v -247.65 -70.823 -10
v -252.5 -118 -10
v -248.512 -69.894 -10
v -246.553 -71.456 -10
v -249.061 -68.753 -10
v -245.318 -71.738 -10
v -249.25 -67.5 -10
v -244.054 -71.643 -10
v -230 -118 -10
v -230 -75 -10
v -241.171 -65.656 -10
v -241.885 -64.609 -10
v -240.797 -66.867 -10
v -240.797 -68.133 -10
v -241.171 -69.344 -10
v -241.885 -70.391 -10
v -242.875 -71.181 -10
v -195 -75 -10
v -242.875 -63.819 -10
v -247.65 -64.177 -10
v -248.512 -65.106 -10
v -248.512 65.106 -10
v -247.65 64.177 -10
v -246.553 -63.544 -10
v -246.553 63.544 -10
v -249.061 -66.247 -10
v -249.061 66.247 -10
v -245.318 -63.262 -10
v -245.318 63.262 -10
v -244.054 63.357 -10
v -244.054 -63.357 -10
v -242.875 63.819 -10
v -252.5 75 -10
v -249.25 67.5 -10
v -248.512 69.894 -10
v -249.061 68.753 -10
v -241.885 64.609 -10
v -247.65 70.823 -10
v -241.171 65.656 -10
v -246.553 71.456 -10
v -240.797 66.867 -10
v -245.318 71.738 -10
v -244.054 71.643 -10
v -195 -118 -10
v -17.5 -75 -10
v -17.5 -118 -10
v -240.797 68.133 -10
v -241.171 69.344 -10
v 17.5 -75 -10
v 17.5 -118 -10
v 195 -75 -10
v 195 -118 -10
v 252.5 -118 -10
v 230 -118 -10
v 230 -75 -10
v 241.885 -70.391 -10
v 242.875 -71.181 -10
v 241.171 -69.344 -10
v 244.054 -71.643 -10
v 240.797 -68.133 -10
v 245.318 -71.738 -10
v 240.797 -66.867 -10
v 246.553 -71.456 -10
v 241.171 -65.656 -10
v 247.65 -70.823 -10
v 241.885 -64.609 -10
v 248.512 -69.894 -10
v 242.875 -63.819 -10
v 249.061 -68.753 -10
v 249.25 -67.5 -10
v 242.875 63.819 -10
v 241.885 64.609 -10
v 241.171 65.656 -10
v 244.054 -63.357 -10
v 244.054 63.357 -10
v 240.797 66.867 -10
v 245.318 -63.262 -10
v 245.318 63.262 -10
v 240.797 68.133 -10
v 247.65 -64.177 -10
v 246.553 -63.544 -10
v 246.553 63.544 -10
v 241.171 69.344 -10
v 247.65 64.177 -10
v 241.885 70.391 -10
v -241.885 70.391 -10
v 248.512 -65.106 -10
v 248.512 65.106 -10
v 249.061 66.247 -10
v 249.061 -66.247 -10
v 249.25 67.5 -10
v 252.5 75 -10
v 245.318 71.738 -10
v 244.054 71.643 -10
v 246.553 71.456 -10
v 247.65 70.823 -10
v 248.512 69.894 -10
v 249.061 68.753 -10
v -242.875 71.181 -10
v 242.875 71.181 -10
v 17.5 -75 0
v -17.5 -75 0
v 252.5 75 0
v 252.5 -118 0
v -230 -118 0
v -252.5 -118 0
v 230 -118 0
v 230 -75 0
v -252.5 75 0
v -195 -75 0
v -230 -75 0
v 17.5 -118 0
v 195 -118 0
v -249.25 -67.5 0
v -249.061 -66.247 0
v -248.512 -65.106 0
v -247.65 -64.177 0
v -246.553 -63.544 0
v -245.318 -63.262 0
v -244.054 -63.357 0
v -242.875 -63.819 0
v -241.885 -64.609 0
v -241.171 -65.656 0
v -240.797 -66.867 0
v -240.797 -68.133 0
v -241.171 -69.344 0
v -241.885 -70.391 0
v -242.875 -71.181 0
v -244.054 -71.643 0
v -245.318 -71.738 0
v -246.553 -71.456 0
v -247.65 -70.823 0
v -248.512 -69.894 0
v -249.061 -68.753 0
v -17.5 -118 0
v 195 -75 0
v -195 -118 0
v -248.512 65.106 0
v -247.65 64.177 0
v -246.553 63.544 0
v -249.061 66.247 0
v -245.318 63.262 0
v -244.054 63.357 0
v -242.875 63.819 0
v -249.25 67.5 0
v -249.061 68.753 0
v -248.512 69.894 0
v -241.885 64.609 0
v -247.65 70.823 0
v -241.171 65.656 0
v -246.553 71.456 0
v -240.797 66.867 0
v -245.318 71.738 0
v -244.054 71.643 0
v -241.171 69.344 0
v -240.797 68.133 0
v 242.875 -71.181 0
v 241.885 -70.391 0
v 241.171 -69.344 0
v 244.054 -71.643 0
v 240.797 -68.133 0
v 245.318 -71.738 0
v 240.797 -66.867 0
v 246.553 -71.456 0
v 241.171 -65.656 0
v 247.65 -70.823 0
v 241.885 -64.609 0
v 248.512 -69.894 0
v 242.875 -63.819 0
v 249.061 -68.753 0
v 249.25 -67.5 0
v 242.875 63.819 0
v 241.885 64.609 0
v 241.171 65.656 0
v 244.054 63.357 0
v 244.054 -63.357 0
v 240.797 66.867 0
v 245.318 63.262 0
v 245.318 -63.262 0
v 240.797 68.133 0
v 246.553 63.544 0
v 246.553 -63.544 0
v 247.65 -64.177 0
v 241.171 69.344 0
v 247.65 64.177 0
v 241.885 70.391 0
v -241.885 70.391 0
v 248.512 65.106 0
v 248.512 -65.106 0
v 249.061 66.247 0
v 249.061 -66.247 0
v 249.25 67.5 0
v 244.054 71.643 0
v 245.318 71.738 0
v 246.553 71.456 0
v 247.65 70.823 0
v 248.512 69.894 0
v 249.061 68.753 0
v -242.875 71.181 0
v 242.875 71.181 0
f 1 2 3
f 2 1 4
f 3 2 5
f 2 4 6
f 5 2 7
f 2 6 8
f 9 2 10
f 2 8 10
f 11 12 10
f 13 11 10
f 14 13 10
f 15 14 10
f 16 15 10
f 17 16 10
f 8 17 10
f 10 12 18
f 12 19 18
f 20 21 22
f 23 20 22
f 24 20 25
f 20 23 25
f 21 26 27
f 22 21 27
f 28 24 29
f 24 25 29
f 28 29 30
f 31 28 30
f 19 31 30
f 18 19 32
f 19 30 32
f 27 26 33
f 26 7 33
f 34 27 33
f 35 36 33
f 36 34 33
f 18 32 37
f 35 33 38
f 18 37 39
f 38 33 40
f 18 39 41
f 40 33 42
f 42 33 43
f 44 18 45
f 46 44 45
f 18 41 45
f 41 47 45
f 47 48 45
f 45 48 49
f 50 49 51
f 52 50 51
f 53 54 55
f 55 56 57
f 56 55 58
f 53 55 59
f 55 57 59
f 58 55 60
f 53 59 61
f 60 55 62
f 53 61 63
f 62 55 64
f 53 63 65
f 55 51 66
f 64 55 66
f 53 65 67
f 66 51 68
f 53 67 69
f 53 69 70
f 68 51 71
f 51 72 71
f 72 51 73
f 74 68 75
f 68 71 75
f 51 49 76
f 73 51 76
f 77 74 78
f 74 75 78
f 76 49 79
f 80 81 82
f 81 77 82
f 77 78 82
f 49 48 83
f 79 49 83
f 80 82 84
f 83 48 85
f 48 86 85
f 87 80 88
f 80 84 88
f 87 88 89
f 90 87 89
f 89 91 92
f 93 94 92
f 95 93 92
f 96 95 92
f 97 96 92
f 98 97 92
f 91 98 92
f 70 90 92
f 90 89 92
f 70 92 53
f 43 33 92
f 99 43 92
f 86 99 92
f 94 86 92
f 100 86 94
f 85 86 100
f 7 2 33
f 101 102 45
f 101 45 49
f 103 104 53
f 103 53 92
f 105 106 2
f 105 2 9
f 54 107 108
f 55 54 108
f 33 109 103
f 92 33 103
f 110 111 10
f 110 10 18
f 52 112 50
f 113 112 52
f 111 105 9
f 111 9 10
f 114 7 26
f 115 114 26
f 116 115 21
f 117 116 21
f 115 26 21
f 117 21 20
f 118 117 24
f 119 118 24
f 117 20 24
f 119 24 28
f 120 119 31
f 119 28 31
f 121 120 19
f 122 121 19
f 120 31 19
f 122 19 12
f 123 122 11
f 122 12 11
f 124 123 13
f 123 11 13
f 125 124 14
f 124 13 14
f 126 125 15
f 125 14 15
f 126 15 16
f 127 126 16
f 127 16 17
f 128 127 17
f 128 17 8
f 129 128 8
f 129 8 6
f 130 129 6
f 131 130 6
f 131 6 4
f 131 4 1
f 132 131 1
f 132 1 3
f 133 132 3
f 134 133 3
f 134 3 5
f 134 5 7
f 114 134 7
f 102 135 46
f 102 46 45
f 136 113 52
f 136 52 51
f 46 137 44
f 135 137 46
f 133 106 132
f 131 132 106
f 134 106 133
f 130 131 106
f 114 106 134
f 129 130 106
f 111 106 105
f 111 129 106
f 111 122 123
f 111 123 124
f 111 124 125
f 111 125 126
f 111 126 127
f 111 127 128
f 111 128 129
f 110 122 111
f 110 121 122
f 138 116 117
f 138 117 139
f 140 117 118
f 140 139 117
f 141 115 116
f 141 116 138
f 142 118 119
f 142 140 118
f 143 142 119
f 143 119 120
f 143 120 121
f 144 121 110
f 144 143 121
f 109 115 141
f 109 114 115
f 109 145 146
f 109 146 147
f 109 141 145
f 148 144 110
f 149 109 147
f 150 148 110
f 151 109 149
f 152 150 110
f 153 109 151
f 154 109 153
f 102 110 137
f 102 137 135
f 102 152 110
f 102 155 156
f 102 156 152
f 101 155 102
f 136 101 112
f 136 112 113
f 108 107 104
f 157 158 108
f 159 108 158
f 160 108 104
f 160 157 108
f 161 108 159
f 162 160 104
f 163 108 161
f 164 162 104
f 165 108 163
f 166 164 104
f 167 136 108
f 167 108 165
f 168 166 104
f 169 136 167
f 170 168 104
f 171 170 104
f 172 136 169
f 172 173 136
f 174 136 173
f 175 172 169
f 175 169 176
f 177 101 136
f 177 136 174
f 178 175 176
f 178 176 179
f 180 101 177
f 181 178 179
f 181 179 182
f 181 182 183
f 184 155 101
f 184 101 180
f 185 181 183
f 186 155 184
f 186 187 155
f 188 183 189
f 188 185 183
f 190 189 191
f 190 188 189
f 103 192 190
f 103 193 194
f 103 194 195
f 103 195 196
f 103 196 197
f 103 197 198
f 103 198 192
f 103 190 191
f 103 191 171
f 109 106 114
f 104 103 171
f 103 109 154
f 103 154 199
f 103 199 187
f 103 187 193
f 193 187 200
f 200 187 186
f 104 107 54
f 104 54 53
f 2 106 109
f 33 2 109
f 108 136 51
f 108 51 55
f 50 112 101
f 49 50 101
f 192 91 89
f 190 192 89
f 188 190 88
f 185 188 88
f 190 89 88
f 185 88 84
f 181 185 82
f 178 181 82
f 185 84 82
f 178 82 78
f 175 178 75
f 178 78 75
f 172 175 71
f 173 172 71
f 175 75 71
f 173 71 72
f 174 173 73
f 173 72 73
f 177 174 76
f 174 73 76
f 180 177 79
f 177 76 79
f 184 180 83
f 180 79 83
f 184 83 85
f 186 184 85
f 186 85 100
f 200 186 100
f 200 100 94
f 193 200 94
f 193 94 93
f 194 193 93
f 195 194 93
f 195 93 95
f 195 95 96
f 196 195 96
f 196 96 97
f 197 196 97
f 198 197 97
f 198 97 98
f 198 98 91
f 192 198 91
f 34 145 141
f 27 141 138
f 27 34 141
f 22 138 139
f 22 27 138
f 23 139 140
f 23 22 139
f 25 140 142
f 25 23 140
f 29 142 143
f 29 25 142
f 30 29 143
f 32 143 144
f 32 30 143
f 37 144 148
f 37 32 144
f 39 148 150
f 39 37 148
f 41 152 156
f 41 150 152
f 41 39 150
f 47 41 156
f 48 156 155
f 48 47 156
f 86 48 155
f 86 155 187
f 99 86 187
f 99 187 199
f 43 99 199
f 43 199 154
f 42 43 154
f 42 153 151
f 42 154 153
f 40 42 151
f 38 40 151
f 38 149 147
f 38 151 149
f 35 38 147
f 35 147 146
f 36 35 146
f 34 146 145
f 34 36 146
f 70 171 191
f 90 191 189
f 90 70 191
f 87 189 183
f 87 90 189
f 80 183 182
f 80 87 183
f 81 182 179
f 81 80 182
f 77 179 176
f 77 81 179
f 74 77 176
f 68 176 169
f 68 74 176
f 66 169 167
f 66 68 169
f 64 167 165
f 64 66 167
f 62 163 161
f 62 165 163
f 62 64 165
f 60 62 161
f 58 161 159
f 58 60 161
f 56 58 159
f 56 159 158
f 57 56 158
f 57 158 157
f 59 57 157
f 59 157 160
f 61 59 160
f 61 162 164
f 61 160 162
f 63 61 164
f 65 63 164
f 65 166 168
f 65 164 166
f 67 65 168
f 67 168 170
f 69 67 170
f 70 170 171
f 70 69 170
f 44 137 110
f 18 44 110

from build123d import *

# Parameters (mm, degrees)
IZIM1_W                   = 505
IZIM1_H                   = 150
TABAN_FLAN_1_DEPTH        = 10
IZIM6_R                   = 4.25
KES_EKSTR_ZYON1_DEPTH     = 264.592962729
AYNALAMA2_COPY_1_SKETCH_R = 4.25
AYNALAMA2_COPY_1_DEPTH    = 264.592962729
IZIM7_W                   = 22.5
IZIM7_H                   = 43
IZIM7_W_2                 = 177.5
SEKME1_DEPTH              = 10


# Sheet-metal steps are written as plain solids
with BuildPart() as part:
    # Çizim1 → Taban-Flanş1 (new body)
    with BuildSketch(Plane.XY):
        Rectangle(IZIM1_W, IZIM1_H)
    extrude(amount=-TABAN_FLAN_1_DEPTH)

    # Çizim6 → Kes-Ekstrüzyon1 (cut, through all)
    with BuildSketch(Plane(origin=(0, 0, -10), x_dir=(-1, 0, 0), z_dir=(0, 0, -1))):
        with Locations((245, -67.5)):
            Circle(IZIM6_R)
    kes_ekstr_zyon1 = extrude(amount=-KES_EKSTR_ZYON1_DEPTH, mode=Mode.SUBTRACT)

    # Aynalama1: Kes-Ekstrüzyon1 across plane
    add(kes_ekstr_zyon1.mirror(Plane(origin=(0, 0, 0), x_dir=(0, 0, 1), z_dir=(1, 0, 0))), mode=Mode.SUBTRACT)

    # Aynalama2: Kes-Ekstrüzyon1 across plane
    add(kes_ekstr_zyon1.mirror(Plane.ZX), mode=Mode.SUBTRACT)

    # Aynalama2 copy 1 sketch → Aynalama2 copy 1 (cut, through all)
    with BuildSketch(Plane(origin=(0, 0, -10), x_dir=(1, 0, 0), z_dir=(0, 0, -1))):
        with Locations((245, -67.5)):
            Circle(AYNALAMA2_COPY_1_SKETCH_R)
    extrude(amount=-AYNALAMA2_COPY_1_DEPTH, mode=Mode.SUBTRACT)

    # Çizim7 → Sekme1 (add)
    with BuildSketch(Plane.XY):
        with Locations((-241.25, -96.5)):
            Rectangle(IZIM7_W, IZIM7_H)
        with Locations((-106.25, -96.5)):
            Rectangle(IZIM7_W_2, IZIM7_H)
        with Locations((106.25, -96.5)):
            Rectangle(IZIM7_W_2, IZIM7_H)
        with Locations((241.25, -96.5)):
            Rectangle(IZIM7_W, IZIM7_H)
    extrude(amount=-SEKME1_DEPTH)


solid = part.part
